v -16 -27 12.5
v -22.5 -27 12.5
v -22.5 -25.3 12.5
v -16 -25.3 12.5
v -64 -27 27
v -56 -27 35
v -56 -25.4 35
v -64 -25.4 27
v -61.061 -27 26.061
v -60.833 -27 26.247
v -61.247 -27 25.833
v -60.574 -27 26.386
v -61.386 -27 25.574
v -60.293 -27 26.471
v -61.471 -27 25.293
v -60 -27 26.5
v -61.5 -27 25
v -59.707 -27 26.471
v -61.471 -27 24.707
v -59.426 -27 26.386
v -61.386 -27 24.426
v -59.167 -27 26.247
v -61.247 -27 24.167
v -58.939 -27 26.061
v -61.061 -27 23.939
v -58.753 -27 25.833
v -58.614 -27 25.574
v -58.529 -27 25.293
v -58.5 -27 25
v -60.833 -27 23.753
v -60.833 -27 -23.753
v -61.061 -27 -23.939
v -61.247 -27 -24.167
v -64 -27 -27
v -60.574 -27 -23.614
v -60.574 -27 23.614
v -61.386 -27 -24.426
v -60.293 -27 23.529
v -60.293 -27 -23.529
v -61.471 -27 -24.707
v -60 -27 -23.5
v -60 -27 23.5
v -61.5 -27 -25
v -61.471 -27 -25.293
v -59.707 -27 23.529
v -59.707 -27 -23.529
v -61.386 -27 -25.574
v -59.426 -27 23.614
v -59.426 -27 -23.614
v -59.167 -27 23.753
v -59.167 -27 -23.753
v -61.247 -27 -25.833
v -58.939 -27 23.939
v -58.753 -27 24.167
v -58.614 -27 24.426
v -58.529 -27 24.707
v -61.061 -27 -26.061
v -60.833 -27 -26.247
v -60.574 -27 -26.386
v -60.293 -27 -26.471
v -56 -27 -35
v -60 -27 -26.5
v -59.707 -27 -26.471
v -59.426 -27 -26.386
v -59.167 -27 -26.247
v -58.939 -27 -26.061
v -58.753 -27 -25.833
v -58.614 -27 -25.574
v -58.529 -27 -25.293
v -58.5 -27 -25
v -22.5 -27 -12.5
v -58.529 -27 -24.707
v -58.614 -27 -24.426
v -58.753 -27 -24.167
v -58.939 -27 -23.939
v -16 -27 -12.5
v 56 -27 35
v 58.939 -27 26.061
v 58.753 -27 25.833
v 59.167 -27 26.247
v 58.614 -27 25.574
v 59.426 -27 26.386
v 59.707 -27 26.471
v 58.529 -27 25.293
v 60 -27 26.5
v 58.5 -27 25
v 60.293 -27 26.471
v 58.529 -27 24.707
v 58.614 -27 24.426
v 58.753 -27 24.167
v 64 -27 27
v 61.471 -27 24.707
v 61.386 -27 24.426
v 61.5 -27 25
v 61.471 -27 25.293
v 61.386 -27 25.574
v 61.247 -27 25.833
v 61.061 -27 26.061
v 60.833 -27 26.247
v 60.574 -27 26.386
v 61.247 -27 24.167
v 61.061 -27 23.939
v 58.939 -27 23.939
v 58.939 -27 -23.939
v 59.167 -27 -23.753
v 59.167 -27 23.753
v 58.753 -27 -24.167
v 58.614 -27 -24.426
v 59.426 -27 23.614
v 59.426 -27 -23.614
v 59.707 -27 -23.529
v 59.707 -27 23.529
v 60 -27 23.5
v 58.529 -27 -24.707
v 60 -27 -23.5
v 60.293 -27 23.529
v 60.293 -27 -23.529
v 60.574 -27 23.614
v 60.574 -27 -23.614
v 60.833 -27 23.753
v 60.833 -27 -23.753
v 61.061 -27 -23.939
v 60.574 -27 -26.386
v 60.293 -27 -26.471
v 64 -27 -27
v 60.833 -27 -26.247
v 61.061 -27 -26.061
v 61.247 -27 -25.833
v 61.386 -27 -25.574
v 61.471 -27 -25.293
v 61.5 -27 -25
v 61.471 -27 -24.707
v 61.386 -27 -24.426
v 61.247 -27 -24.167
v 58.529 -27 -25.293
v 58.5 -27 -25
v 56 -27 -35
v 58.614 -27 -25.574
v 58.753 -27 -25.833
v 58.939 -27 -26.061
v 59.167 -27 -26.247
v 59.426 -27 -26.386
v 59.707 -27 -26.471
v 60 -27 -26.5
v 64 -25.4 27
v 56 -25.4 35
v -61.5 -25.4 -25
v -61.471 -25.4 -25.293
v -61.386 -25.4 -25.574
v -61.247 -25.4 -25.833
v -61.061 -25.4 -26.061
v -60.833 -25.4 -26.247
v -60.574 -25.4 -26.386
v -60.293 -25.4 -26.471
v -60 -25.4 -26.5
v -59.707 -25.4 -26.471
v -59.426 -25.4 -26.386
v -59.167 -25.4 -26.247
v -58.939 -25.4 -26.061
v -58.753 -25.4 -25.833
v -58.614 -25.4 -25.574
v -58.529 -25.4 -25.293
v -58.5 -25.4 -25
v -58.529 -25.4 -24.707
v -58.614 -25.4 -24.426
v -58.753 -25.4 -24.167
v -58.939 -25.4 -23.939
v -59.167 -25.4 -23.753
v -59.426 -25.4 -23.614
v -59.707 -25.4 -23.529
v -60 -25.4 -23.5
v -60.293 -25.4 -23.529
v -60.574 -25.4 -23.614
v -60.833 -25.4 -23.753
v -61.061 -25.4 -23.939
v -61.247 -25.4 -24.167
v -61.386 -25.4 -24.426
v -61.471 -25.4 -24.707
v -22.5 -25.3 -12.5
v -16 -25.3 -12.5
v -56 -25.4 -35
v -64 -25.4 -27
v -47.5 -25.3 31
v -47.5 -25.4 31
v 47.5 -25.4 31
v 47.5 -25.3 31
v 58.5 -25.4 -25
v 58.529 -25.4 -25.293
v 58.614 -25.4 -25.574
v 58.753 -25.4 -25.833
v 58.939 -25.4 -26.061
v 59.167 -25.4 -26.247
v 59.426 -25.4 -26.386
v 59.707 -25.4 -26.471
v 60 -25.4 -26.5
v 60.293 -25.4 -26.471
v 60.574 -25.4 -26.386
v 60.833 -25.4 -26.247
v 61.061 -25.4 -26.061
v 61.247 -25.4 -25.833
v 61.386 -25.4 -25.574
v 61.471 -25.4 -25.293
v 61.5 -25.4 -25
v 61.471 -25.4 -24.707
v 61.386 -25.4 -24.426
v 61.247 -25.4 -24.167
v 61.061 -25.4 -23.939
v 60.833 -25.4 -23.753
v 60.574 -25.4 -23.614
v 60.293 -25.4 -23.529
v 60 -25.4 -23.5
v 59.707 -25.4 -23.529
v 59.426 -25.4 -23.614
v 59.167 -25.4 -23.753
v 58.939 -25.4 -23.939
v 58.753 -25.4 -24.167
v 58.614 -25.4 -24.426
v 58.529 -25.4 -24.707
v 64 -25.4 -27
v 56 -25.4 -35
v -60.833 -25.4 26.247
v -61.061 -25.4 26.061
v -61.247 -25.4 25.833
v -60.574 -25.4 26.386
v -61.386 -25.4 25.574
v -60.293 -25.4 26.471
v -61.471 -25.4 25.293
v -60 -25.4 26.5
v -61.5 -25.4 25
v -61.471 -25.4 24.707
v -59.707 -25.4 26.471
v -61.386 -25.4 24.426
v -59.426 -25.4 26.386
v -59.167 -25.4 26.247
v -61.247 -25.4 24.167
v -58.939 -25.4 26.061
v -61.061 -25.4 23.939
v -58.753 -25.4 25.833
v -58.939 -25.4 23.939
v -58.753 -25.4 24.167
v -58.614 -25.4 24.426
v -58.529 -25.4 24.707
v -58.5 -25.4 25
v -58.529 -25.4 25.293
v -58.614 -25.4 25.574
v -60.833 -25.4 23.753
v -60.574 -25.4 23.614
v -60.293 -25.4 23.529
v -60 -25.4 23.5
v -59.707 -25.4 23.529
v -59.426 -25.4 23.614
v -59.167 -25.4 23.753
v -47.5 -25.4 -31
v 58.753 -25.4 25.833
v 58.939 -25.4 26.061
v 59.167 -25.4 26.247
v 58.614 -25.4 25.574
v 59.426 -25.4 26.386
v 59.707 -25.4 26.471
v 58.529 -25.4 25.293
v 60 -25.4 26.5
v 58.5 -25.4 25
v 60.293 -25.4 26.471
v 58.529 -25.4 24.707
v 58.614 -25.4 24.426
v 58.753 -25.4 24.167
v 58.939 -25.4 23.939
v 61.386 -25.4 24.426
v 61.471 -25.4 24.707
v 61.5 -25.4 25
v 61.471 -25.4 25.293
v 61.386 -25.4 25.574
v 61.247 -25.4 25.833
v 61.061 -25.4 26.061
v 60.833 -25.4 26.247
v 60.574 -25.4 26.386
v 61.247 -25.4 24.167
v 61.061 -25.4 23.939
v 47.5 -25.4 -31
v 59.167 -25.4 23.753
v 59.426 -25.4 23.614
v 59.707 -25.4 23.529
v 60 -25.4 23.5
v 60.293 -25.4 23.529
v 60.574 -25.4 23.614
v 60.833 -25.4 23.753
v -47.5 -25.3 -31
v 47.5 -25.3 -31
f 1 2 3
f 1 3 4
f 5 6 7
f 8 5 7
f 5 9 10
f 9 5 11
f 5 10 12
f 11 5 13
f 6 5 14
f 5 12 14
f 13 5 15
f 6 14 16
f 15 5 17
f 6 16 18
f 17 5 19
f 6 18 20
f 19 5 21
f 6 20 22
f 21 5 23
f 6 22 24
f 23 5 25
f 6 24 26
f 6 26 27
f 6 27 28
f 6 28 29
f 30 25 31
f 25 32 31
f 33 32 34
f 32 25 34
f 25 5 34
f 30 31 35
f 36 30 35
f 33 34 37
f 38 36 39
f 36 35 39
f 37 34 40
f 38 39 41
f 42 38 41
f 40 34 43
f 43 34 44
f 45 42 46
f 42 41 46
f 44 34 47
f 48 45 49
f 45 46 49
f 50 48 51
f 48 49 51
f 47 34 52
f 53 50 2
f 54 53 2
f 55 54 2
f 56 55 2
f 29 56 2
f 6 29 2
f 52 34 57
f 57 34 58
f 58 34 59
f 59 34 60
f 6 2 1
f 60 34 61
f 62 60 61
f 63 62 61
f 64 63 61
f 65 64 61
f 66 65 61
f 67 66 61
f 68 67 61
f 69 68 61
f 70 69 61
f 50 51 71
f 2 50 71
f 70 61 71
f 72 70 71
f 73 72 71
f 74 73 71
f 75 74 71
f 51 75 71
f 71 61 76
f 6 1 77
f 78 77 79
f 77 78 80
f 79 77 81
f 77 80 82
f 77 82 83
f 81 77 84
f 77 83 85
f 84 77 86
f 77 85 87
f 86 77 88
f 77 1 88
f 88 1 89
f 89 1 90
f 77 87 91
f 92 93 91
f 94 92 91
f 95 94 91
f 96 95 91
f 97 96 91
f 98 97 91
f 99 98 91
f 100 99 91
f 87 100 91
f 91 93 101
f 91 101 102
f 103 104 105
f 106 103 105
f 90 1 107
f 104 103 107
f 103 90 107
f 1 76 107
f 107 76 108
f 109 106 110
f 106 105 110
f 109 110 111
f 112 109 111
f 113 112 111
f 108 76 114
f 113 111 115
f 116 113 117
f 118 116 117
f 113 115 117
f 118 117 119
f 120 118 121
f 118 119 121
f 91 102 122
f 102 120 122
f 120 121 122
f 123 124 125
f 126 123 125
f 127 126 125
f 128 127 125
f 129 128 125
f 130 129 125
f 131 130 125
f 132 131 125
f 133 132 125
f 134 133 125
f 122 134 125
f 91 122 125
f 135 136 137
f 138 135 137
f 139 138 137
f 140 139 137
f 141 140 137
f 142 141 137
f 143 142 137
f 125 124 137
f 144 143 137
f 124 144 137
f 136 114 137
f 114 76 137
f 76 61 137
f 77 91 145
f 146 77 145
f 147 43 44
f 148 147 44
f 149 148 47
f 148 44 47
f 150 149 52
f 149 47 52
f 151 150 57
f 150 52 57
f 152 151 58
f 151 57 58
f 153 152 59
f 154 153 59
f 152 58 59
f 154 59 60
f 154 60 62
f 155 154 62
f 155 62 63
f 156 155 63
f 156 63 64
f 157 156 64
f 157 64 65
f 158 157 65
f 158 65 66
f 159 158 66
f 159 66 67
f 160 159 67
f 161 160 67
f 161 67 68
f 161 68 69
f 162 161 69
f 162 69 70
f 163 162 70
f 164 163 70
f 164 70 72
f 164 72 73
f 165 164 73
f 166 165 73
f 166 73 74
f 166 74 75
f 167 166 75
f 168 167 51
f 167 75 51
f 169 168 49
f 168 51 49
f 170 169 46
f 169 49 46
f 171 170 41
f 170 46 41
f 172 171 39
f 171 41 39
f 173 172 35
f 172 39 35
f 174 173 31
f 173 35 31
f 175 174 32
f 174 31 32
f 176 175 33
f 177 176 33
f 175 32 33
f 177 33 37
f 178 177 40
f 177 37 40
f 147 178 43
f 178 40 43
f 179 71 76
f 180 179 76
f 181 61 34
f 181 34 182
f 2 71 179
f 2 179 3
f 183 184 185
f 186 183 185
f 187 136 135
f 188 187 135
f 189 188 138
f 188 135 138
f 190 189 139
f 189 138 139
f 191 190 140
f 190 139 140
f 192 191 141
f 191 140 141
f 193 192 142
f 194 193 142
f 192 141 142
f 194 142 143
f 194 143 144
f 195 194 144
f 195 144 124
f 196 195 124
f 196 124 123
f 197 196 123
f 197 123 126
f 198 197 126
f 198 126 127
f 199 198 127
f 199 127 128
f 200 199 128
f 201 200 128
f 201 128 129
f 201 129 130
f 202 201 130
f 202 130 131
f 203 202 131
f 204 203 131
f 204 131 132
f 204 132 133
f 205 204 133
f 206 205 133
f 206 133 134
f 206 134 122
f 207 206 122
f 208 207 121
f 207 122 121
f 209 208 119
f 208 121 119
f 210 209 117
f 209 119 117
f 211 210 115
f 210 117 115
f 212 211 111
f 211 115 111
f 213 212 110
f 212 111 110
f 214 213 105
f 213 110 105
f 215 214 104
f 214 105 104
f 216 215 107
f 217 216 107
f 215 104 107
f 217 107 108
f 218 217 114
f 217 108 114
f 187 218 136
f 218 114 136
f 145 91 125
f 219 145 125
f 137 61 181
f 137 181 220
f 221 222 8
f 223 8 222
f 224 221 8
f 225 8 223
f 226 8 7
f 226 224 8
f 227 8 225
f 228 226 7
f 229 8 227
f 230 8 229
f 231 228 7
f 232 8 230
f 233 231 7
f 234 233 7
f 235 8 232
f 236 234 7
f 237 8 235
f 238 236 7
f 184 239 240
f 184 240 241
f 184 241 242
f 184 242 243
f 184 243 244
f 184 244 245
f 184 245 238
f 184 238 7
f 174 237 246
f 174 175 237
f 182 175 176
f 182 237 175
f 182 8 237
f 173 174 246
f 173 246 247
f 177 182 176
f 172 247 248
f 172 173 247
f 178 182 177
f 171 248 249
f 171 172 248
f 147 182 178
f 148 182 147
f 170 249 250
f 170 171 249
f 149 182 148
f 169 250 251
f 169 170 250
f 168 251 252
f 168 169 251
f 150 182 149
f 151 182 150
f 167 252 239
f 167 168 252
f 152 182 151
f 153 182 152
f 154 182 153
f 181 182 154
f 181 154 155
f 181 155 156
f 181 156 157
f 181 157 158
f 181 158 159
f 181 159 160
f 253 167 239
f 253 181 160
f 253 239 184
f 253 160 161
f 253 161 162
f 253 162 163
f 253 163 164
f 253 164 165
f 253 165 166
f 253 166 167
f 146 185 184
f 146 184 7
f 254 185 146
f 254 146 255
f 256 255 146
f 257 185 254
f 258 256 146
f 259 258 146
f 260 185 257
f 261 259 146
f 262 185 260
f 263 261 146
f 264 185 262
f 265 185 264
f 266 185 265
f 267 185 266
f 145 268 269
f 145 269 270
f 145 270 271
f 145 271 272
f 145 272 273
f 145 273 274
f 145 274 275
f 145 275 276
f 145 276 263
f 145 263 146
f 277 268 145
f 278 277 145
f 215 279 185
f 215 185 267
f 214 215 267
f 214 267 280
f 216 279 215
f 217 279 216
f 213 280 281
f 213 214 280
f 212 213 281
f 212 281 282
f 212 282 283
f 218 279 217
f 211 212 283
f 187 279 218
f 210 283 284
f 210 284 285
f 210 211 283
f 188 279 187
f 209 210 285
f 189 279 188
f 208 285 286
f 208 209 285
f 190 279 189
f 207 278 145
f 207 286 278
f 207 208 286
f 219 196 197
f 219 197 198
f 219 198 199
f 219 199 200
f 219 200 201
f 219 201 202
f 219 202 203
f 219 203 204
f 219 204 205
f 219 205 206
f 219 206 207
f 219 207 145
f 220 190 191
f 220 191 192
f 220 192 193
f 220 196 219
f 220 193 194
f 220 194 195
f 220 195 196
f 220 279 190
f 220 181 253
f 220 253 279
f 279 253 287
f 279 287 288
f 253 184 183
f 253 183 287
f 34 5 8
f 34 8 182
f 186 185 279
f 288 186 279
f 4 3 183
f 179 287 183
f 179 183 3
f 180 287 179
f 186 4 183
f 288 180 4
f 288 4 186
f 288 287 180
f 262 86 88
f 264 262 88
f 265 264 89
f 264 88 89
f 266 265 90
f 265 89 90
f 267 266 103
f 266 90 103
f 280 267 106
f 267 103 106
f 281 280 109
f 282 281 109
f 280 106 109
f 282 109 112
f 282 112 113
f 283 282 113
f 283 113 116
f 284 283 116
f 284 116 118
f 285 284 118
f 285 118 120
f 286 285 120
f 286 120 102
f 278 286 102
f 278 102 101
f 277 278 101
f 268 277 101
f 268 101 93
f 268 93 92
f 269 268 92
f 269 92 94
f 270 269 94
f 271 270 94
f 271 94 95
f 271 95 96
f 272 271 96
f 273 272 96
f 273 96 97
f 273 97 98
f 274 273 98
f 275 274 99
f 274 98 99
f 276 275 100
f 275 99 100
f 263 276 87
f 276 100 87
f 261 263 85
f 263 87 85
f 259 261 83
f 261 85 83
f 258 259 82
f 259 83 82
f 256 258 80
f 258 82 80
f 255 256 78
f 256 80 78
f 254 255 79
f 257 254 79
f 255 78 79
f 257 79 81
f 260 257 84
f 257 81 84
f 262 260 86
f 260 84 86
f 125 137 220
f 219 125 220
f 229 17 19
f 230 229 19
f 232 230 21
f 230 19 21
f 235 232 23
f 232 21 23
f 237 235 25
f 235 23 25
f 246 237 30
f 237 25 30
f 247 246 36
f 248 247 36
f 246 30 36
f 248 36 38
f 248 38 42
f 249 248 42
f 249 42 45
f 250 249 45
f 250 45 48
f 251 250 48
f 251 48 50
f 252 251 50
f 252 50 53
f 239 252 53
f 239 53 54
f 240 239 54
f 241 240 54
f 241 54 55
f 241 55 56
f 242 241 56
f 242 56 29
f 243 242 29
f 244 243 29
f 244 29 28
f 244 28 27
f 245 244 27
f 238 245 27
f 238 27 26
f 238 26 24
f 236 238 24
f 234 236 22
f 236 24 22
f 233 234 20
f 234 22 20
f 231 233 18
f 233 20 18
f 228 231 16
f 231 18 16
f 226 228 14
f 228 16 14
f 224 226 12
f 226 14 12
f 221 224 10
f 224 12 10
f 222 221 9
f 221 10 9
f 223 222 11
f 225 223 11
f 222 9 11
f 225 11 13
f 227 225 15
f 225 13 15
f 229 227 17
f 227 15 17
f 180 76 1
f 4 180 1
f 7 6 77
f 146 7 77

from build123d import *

# Parameters (mm, degrees)
SKETCH1_W                = 128
SKETCH1_H                = 70
BOSS_EXTRUDE1_DEPTH      = 1.6
CHAMFER1_SIZE            = 8
F_3_0_3_DIAMETER_HOLE1_D = 3
SKETCH4_W                = 95
SKETCH4_H                = 62
BOSS_EXTRUDE2_DEPTH      = 0.1
SKETCH5_W                = 6.5
SKETCH5_H                = 25
CUT_EXTRUDE1_DEPTH       = 2.7


with BuildPart() as part:
    # Sketch1 → Boss-Extrude1 (new body)
    with BuildSketch(Plane(origin=(0, -27, 0), x_dir=(1, 0, 0), z_dir=(0, 1, 0))):
        Rectangle(SKETCH1_W, SKETCH1_H)
    extrude(amount=BOSS_EXTRUDE1_DEPTH)

    # Chamfer1
    chamfer1_edges = [part.edges().sort_by_distance(p)[0] for p in [
        (64, -26.2, 35),
        (-64, -26.2, 35),
        (-64, -26.2, -35),
        (64, -26.2, -35),
    ]]
    chamfer(chamfer1_edges, length=CHAMFER1_SIZE)

    # Ø3.0 (3) Diameter Hole1 (through all)
    with Locations(Plane(origin=(0, -25.4, 0), x_dir=(1, 0, 0), z_dir=(0, 1, 0))):
        with Locations((-60, -25), (-60, 25), (60, 25), (60, -25)):
            Hole(F_3_0_3_DIAMETER_HOLE1_D / 2)

    # Sketch4 → Boss-Extrude2 (add)
    with BuildSketch(Plane(origin=(0, -25.4, 0), x_dir=(1, 0, 0), z_dir=(0, 1, 0))):
        Rectangle(SKETCH4_W, SKETCH4_H)
    extrude(amount=BOSS_EXTRUDE2_DEPTH)

    # Sketch5 → Cut-Extrude1 (cut, through all)
    with BuildSketch(Plane.XZ.offset(27)):
        with Locations((-19.25, 0)):
            Rectangle(SKETCH5_W, SKETCH5_H)
    extrude(amount=-CUT_EXTRUDE1_DEPTH, mode=Mode.SUBTRACT)


solid = part.part
